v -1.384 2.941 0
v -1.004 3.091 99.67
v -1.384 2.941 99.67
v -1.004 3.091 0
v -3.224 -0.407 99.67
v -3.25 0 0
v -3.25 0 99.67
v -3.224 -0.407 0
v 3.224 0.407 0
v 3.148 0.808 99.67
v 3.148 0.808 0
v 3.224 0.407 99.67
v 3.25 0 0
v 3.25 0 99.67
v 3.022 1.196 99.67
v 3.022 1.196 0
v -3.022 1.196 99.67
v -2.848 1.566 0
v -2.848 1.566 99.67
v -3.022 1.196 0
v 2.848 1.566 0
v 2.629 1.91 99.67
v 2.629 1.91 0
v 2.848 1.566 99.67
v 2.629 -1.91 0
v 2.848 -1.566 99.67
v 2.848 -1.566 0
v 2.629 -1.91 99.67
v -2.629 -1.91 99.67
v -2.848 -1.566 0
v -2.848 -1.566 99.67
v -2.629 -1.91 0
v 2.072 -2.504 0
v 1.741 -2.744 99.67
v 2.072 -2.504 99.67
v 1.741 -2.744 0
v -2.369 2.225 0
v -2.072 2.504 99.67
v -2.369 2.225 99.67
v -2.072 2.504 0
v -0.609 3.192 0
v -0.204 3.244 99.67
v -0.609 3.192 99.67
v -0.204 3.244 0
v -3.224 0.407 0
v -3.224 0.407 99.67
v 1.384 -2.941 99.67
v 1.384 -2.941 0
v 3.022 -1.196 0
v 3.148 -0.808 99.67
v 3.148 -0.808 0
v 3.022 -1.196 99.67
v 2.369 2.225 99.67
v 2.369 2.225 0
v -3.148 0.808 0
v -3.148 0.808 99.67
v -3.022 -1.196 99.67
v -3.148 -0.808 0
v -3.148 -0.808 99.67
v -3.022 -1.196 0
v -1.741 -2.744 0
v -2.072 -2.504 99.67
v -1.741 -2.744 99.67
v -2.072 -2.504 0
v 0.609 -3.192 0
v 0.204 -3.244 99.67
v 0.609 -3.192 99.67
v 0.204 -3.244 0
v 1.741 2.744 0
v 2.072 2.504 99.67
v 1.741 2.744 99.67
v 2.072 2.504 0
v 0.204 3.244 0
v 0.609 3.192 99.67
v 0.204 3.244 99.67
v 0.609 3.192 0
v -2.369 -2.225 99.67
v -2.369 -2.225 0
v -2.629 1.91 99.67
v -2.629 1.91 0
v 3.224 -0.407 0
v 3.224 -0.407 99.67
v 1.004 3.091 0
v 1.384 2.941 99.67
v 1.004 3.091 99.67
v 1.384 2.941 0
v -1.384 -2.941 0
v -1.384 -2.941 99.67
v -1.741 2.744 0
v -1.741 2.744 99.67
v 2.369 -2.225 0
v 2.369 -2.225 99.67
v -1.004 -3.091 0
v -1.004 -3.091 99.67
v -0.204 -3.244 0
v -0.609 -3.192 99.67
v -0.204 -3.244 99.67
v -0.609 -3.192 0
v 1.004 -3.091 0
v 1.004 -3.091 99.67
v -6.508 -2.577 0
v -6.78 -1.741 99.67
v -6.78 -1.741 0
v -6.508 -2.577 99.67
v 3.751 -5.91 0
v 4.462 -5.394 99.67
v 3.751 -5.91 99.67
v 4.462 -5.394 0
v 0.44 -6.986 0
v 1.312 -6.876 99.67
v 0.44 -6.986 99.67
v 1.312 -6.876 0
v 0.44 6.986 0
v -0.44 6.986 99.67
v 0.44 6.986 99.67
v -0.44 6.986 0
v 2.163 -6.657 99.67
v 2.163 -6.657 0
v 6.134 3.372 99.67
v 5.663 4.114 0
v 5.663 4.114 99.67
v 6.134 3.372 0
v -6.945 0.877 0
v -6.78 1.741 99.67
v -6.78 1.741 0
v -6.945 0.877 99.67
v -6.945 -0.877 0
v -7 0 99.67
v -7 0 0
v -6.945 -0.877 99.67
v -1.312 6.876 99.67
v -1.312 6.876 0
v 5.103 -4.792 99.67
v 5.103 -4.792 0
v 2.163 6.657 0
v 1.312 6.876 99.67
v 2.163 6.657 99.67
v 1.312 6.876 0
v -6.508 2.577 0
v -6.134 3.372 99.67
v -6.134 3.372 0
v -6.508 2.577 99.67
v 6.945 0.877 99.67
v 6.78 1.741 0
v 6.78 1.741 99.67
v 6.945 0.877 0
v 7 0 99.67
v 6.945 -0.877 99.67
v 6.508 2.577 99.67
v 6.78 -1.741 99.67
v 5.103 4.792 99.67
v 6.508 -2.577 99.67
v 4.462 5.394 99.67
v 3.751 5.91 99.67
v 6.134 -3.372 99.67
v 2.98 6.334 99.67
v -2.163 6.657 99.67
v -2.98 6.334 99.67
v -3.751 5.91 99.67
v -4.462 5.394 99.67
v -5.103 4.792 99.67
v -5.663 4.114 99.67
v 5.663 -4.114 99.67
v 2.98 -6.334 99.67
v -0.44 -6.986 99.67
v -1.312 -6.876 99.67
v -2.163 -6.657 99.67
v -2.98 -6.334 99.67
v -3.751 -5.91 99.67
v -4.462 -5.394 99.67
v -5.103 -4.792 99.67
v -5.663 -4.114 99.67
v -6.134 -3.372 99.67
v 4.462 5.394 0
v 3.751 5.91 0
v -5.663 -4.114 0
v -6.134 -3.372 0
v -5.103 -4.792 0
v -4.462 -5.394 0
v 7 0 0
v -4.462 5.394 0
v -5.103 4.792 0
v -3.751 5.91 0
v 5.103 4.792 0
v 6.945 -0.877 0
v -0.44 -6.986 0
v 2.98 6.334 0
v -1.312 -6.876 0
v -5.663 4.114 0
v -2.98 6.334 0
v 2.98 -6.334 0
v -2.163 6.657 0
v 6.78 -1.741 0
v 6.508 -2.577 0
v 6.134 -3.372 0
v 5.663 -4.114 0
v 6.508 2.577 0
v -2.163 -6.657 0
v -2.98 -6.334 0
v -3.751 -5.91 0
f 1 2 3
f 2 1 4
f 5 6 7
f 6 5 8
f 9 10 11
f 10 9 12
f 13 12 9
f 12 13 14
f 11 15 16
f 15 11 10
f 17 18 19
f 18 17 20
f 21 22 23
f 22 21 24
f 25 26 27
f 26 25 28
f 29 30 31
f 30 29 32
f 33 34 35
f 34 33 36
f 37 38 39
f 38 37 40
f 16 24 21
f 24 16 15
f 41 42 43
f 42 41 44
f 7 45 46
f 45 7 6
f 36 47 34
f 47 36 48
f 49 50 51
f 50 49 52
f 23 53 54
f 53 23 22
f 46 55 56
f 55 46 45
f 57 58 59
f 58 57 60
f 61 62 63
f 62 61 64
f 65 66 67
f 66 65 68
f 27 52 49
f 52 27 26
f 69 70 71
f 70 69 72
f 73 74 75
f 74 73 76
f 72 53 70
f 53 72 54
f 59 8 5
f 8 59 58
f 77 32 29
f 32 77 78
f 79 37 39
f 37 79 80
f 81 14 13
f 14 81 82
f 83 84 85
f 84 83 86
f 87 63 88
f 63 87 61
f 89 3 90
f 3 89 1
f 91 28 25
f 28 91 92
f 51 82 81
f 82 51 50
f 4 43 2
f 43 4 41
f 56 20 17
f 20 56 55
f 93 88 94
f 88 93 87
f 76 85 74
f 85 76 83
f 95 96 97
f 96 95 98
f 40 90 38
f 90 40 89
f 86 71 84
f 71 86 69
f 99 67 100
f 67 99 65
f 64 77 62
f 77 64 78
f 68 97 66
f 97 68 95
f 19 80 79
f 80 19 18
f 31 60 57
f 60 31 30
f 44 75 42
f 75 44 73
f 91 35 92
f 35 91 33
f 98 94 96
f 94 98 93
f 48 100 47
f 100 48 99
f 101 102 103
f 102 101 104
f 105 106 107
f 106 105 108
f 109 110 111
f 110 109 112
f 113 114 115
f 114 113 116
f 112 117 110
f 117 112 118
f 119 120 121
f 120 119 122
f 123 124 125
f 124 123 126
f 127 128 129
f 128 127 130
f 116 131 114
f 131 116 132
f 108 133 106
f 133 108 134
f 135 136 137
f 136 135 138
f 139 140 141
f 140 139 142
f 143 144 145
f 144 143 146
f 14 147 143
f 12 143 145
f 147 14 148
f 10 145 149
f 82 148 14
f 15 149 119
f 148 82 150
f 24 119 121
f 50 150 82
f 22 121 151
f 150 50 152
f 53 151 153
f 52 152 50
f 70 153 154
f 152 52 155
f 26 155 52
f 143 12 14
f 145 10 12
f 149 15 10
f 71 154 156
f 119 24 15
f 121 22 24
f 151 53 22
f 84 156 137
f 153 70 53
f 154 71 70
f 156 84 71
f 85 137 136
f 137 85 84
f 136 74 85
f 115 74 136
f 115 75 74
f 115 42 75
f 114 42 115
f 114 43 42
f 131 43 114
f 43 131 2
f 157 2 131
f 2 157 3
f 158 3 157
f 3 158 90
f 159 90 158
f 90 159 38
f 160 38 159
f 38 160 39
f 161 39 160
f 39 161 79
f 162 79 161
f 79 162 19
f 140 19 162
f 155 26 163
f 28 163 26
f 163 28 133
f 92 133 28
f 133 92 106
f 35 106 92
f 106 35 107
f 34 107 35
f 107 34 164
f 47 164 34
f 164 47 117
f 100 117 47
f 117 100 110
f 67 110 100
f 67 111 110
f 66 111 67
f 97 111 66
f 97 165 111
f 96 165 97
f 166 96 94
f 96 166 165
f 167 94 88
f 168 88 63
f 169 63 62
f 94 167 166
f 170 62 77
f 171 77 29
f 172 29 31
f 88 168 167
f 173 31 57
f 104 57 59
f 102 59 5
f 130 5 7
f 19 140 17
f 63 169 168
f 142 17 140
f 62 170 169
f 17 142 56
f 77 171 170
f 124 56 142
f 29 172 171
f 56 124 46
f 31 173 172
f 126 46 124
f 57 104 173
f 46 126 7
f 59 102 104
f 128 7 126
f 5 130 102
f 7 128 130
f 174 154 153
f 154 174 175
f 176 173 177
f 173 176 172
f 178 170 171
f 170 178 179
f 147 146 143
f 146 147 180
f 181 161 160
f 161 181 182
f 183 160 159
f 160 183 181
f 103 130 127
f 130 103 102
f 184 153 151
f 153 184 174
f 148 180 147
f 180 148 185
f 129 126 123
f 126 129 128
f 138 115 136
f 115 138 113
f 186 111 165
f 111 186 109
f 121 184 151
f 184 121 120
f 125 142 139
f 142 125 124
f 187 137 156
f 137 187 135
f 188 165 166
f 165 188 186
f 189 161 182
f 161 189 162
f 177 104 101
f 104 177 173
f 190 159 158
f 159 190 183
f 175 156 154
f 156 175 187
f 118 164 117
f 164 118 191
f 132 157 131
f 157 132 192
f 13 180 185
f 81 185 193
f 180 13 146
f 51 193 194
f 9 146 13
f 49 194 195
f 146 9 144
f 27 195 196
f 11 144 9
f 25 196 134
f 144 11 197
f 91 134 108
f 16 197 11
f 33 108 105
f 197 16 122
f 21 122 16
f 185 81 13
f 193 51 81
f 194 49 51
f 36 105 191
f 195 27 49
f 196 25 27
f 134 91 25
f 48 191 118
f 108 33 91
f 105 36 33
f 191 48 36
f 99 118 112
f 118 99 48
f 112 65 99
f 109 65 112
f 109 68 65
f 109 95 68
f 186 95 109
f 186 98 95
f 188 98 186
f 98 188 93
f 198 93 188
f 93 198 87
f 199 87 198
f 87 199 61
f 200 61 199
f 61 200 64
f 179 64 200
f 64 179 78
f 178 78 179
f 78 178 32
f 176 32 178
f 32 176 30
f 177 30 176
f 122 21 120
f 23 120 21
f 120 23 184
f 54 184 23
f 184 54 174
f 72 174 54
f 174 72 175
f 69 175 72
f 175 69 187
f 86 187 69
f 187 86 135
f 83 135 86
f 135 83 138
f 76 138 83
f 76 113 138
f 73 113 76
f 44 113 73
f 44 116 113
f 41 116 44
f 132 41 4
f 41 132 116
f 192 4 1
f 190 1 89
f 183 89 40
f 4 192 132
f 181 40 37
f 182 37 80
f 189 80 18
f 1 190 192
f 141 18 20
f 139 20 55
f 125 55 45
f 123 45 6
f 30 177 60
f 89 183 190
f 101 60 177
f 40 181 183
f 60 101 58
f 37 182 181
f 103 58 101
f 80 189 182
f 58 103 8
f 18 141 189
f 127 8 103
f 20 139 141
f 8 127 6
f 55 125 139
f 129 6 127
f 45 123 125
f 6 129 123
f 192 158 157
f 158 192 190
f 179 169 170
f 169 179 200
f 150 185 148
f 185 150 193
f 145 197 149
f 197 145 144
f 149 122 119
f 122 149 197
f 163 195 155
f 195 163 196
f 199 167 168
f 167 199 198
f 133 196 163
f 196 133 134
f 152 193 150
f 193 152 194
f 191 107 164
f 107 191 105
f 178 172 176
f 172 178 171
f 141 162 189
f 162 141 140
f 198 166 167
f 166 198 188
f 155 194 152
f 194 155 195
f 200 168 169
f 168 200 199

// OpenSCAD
$fn = 50;


difference() {
	union() {
		cylinder(h = 99.6700000000, r = 7.0000000000);
	}
	union() {
		translate(v = [0, 0, -100]) {
			cylinder(h = 200, r = 3.2500000000);
		}
		translate(v = [0, 0, -100]) {
			cylinder(h = 200, r = 1.8000000000);
		}
	}
}
